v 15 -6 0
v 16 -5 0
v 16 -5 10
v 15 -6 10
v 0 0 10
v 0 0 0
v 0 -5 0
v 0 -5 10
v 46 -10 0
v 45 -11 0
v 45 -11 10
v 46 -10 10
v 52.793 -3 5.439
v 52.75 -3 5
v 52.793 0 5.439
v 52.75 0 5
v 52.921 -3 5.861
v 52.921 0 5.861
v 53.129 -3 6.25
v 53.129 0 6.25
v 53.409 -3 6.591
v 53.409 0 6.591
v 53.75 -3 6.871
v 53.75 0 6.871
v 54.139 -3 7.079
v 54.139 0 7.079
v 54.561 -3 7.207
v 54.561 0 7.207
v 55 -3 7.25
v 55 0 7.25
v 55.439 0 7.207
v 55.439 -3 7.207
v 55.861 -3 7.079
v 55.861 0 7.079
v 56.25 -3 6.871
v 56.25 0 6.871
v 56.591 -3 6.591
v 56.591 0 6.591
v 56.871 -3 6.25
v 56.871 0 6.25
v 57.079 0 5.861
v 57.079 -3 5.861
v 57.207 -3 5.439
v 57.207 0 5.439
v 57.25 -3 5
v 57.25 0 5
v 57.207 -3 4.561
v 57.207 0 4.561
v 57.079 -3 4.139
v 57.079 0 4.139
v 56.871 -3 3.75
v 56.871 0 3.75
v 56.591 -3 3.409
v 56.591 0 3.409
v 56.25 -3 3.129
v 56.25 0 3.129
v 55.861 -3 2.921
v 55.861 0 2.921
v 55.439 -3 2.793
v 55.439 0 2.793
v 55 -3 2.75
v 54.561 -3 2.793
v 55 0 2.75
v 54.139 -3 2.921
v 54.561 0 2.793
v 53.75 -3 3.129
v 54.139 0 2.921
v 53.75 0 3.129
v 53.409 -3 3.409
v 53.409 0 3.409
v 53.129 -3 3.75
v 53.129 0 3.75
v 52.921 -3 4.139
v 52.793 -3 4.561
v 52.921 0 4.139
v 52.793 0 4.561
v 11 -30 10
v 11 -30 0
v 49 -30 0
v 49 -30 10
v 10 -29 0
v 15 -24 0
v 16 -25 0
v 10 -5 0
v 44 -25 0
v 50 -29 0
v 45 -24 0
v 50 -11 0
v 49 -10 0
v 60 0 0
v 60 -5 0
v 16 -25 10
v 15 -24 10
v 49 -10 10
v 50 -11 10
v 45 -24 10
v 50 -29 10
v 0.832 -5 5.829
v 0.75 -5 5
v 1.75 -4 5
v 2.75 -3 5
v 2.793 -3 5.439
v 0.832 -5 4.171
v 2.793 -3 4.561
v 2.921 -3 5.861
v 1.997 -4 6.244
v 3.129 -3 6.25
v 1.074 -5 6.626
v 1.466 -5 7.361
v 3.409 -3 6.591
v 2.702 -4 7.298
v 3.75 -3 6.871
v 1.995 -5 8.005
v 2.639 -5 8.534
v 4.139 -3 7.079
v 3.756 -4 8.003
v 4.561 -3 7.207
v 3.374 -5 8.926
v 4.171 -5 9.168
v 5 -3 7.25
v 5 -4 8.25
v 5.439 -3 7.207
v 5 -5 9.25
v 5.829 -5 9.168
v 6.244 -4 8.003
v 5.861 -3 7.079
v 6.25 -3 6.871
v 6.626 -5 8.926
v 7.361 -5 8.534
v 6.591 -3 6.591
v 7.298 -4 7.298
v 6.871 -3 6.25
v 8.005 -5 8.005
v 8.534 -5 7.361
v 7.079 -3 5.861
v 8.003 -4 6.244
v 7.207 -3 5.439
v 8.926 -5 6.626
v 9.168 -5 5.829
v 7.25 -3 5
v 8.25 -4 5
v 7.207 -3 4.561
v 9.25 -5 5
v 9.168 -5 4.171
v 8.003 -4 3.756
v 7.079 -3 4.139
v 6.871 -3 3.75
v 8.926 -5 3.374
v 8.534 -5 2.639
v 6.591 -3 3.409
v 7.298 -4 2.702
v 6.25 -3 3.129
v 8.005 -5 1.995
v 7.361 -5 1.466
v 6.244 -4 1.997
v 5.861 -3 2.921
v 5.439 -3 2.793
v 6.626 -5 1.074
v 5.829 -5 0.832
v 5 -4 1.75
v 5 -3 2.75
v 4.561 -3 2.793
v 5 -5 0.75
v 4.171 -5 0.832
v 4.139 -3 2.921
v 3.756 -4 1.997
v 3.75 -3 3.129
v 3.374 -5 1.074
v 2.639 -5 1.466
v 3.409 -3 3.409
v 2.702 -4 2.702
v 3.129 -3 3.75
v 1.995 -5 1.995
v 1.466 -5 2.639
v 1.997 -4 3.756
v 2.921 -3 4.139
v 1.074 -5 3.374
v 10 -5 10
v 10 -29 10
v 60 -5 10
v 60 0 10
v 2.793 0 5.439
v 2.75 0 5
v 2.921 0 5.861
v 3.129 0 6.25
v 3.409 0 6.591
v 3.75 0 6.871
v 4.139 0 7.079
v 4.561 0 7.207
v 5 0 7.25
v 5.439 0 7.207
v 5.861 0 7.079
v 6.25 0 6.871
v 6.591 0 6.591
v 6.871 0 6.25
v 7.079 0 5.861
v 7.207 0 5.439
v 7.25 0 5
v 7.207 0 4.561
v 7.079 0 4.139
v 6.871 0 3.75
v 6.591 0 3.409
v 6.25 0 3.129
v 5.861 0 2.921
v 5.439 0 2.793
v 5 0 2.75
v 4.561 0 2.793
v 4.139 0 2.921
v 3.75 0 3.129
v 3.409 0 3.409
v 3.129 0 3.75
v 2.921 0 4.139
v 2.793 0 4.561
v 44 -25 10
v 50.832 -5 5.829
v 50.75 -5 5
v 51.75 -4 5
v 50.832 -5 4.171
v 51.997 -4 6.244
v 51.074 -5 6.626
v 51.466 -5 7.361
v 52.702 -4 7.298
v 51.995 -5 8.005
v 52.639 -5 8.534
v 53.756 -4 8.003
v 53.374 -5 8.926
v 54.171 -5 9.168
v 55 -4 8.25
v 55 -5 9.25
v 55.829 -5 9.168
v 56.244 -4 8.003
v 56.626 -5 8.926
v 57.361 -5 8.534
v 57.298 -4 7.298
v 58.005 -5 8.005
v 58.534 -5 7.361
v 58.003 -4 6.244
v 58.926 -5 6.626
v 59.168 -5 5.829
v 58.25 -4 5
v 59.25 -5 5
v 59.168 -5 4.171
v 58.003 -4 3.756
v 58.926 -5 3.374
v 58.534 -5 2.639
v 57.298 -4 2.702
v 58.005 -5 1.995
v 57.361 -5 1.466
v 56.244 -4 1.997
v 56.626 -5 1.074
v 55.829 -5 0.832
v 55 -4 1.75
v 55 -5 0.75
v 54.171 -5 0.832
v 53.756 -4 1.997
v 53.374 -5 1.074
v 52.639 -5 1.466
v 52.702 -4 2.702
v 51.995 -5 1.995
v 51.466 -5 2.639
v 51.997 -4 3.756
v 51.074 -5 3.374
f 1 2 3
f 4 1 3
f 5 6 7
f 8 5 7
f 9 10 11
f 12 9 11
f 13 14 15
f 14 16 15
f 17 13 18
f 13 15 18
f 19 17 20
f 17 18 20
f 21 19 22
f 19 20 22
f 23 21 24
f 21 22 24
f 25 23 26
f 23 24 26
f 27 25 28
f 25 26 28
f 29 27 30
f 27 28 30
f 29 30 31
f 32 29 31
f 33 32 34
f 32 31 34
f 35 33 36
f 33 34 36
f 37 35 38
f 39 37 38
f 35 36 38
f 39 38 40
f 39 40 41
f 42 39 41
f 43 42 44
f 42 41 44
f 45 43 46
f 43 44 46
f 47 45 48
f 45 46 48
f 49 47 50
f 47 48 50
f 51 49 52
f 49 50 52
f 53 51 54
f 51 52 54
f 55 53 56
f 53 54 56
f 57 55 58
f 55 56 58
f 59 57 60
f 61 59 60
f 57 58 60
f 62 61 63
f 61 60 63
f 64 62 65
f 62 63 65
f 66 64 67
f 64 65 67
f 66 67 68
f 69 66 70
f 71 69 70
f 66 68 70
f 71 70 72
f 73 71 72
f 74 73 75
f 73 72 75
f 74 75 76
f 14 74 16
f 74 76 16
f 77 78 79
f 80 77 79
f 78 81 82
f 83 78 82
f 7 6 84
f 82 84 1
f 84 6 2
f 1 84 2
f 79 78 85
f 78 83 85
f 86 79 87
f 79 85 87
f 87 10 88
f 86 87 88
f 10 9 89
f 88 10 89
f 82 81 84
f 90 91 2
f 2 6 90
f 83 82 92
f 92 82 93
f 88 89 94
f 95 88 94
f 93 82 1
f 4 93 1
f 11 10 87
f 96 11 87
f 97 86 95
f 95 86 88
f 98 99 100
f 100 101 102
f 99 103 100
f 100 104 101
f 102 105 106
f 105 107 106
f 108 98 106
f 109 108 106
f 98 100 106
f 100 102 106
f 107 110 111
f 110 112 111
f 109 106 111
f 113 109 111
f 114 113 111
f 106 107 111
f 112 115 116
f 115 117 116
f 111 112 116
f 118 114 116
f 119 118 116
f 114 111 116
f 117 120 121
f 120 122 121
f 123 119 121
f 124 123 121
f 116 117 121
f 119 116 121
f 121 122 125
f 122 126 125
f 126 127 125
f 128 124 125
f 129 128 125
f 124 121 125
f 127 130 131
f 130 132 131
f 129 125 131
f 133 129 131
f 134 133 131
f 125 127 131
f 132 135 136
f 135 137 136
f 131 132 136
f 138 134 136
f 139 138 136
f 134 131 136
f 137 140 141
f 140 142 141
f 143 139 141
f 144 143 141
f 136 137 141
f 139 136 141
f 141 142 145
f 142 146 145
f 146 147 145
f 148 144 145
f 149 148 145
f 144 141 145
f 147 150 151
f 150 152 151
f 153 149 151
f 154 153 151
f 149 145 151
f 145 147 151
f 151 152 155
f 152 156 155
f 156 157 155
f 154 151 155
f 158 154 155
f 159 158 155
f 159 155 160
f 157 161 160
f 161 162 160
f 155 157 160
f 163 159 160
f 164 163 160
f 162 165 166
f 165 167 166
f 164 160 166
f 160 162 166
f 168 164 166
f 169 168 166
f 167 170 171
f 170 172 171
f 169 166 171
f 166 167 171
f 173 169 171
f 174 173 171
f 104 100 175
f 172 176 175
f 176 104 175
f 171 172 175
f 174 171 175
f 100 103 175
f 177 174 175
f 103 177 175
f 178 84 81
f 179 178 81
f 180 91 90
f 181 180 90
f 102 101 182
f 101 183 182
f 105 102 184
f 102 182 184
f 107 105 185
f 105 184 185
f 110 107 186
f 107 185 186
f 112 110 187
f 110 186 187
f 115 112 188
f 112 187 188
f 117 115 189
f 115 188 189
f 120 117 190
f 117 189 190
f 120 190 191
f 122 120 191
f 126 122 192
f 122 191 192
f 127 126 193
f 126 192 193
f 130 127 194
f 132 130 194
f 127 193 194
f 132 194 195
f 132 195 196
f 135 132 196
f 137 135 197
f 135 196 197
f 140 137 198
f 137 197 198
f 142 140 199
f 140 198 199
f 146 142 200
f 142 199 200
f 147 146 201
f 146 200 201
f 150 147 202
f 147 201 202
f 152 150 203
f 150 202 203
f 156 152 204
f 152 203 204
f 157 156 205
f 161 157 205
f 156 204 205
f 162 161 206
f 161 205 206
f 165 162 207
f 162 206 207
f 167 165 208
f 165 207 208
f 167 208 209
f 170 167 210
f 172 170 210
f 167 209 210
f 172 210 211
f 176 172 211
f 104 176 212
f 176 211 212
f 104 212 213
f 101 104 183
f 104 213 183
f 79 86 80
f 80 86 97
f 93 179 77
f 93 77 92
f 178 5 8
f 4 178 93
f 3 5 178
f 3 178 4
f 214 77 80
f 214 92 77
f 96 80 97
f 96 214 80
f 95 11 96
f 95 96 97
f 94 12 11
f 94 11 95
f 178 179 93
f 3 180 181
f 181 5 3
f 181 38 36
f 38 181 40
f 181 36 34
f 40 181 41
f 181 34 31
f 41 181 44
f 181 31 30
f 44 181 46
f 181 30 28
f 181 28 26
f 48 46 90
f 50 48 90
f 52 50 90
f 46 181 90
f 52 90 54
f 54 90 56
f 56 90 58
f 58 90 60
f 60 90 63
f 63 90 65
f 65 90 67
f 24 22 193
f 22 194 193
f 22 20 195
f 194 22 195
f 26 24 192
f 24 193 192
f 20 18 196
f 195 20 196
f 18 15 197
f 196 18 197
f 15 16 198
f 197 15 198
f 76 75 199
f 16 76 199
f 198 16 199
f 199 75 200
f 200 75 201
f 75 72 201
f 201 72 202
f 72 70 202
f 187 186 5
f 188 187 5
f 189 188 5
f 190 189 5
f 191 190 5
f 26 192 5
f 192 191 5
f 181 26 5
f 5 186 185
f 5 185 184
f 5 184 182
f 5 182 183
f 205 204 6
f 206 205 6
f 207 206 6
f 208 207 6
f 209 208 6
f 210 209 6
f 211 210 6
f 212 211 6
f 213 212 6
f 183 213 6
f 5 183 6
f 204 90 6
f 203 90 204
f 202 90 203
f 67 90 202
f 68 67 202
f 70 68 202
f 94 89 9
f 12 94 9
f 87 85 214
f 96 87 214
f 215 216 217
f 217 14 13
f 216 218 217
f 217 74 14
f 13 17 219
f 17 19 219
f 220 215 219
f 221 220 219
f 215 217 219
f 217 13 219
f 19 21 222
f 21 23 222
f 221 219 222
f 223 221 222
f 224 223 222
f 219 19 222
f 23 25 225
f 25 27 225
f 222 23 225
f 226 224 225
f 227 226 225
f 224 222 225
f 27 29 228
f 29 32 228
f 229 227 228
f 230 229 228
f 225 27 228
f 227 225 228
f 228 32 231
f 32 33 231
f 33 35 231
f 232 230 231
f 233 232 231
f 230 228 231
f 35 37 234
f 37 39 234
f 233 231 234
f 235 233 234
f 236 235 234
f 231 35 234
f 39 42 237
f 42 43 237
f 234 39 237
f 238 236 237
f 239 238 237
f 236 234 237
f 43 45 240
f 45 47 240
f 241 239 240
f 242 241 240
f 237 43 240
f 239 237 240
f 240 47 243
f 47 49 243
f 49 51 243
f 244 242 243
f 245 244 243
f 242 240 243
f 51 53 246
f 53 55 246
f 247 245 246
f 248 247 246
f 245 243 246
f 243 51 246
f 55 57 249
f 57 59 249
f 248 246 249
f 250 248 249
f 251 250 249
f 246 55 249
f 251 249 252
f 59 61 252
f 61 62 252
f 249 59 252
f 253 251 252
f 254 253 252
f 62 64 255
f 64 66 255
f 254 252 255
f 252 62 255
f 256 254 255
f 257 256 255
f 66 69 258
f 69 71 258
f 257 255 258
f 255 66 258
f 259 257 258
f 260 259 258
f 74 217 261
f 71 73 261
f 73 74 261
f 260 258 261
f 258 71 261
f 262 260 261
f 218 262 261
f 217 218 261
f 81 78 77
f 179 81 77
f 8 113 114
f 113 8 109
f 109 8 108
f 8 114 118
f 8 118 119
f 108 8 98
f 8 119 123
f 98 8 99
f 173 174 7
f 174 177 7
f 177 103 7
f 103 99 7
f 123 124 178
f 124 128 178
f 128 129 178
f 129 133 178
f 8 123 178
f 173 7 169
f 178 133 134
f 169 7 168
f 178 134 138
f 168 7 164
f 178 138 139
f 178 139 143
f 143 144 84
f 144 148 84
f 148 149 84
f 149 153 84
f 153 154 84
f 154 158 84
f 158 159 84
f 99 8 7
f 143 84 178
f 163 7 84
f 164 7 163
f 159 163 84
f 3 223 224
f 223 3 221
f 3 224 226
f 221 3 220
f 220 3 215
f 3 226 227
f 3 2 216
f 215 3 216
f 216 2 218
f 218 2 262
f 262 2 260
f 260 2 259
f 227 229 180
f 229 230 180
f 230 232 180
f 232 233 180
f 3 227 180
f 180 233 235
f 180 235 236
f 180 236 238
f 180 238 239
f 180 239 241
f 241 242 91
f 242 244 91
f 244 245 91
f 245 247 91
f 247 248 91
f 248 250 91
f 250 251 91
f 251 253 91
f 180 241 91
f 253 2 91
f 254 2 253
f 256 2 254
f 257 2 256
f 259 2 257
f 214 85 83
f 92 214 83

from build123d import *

# Parameters (mm, degrees)
F1_DEPTH       = 10
F3_D           = 4.5
F3_CSINK_D     = 8.5
F3_CSINK_ANGLE = 90
F4_SIZE        = 1


with BuildPart() as f1:
    # F0 (on Top) → F1 (new body)
    with BuildSketch(Plane.XY):
        Polygon((60, 0), (0, 0), (0, -5), (10, -5), (10, -30), (50, -30), (50, -10), (45, -10), (45, -25), (15, -25), (15, -5), (60, -5), align=None)
    extrude(amount=F1_DEPTH)

    # F3 (through all)
    with Locations(Plane.XZ.offset(5)):
        with Locations((5, 5), (55, 5)):
            CounterSinkHole(F3_D / 2, F3_CSINK_D / 2, counter_sink_angle=F3_CSINK_ANGLE)

    # F4
    f4_edges = [f1.edges().sort_by_distance(p)[0] for p in [
        (50, -10, 5),
        (45, -10, 5),
        (15, -5, 5),
        (15, -25, 5),
        (45, -25, 5),
        (50, -30, 5),
        (10, -30, 5),
    ]]
    chamfer(f4_edges, length=F4_SIZE)


solid = f1.part
